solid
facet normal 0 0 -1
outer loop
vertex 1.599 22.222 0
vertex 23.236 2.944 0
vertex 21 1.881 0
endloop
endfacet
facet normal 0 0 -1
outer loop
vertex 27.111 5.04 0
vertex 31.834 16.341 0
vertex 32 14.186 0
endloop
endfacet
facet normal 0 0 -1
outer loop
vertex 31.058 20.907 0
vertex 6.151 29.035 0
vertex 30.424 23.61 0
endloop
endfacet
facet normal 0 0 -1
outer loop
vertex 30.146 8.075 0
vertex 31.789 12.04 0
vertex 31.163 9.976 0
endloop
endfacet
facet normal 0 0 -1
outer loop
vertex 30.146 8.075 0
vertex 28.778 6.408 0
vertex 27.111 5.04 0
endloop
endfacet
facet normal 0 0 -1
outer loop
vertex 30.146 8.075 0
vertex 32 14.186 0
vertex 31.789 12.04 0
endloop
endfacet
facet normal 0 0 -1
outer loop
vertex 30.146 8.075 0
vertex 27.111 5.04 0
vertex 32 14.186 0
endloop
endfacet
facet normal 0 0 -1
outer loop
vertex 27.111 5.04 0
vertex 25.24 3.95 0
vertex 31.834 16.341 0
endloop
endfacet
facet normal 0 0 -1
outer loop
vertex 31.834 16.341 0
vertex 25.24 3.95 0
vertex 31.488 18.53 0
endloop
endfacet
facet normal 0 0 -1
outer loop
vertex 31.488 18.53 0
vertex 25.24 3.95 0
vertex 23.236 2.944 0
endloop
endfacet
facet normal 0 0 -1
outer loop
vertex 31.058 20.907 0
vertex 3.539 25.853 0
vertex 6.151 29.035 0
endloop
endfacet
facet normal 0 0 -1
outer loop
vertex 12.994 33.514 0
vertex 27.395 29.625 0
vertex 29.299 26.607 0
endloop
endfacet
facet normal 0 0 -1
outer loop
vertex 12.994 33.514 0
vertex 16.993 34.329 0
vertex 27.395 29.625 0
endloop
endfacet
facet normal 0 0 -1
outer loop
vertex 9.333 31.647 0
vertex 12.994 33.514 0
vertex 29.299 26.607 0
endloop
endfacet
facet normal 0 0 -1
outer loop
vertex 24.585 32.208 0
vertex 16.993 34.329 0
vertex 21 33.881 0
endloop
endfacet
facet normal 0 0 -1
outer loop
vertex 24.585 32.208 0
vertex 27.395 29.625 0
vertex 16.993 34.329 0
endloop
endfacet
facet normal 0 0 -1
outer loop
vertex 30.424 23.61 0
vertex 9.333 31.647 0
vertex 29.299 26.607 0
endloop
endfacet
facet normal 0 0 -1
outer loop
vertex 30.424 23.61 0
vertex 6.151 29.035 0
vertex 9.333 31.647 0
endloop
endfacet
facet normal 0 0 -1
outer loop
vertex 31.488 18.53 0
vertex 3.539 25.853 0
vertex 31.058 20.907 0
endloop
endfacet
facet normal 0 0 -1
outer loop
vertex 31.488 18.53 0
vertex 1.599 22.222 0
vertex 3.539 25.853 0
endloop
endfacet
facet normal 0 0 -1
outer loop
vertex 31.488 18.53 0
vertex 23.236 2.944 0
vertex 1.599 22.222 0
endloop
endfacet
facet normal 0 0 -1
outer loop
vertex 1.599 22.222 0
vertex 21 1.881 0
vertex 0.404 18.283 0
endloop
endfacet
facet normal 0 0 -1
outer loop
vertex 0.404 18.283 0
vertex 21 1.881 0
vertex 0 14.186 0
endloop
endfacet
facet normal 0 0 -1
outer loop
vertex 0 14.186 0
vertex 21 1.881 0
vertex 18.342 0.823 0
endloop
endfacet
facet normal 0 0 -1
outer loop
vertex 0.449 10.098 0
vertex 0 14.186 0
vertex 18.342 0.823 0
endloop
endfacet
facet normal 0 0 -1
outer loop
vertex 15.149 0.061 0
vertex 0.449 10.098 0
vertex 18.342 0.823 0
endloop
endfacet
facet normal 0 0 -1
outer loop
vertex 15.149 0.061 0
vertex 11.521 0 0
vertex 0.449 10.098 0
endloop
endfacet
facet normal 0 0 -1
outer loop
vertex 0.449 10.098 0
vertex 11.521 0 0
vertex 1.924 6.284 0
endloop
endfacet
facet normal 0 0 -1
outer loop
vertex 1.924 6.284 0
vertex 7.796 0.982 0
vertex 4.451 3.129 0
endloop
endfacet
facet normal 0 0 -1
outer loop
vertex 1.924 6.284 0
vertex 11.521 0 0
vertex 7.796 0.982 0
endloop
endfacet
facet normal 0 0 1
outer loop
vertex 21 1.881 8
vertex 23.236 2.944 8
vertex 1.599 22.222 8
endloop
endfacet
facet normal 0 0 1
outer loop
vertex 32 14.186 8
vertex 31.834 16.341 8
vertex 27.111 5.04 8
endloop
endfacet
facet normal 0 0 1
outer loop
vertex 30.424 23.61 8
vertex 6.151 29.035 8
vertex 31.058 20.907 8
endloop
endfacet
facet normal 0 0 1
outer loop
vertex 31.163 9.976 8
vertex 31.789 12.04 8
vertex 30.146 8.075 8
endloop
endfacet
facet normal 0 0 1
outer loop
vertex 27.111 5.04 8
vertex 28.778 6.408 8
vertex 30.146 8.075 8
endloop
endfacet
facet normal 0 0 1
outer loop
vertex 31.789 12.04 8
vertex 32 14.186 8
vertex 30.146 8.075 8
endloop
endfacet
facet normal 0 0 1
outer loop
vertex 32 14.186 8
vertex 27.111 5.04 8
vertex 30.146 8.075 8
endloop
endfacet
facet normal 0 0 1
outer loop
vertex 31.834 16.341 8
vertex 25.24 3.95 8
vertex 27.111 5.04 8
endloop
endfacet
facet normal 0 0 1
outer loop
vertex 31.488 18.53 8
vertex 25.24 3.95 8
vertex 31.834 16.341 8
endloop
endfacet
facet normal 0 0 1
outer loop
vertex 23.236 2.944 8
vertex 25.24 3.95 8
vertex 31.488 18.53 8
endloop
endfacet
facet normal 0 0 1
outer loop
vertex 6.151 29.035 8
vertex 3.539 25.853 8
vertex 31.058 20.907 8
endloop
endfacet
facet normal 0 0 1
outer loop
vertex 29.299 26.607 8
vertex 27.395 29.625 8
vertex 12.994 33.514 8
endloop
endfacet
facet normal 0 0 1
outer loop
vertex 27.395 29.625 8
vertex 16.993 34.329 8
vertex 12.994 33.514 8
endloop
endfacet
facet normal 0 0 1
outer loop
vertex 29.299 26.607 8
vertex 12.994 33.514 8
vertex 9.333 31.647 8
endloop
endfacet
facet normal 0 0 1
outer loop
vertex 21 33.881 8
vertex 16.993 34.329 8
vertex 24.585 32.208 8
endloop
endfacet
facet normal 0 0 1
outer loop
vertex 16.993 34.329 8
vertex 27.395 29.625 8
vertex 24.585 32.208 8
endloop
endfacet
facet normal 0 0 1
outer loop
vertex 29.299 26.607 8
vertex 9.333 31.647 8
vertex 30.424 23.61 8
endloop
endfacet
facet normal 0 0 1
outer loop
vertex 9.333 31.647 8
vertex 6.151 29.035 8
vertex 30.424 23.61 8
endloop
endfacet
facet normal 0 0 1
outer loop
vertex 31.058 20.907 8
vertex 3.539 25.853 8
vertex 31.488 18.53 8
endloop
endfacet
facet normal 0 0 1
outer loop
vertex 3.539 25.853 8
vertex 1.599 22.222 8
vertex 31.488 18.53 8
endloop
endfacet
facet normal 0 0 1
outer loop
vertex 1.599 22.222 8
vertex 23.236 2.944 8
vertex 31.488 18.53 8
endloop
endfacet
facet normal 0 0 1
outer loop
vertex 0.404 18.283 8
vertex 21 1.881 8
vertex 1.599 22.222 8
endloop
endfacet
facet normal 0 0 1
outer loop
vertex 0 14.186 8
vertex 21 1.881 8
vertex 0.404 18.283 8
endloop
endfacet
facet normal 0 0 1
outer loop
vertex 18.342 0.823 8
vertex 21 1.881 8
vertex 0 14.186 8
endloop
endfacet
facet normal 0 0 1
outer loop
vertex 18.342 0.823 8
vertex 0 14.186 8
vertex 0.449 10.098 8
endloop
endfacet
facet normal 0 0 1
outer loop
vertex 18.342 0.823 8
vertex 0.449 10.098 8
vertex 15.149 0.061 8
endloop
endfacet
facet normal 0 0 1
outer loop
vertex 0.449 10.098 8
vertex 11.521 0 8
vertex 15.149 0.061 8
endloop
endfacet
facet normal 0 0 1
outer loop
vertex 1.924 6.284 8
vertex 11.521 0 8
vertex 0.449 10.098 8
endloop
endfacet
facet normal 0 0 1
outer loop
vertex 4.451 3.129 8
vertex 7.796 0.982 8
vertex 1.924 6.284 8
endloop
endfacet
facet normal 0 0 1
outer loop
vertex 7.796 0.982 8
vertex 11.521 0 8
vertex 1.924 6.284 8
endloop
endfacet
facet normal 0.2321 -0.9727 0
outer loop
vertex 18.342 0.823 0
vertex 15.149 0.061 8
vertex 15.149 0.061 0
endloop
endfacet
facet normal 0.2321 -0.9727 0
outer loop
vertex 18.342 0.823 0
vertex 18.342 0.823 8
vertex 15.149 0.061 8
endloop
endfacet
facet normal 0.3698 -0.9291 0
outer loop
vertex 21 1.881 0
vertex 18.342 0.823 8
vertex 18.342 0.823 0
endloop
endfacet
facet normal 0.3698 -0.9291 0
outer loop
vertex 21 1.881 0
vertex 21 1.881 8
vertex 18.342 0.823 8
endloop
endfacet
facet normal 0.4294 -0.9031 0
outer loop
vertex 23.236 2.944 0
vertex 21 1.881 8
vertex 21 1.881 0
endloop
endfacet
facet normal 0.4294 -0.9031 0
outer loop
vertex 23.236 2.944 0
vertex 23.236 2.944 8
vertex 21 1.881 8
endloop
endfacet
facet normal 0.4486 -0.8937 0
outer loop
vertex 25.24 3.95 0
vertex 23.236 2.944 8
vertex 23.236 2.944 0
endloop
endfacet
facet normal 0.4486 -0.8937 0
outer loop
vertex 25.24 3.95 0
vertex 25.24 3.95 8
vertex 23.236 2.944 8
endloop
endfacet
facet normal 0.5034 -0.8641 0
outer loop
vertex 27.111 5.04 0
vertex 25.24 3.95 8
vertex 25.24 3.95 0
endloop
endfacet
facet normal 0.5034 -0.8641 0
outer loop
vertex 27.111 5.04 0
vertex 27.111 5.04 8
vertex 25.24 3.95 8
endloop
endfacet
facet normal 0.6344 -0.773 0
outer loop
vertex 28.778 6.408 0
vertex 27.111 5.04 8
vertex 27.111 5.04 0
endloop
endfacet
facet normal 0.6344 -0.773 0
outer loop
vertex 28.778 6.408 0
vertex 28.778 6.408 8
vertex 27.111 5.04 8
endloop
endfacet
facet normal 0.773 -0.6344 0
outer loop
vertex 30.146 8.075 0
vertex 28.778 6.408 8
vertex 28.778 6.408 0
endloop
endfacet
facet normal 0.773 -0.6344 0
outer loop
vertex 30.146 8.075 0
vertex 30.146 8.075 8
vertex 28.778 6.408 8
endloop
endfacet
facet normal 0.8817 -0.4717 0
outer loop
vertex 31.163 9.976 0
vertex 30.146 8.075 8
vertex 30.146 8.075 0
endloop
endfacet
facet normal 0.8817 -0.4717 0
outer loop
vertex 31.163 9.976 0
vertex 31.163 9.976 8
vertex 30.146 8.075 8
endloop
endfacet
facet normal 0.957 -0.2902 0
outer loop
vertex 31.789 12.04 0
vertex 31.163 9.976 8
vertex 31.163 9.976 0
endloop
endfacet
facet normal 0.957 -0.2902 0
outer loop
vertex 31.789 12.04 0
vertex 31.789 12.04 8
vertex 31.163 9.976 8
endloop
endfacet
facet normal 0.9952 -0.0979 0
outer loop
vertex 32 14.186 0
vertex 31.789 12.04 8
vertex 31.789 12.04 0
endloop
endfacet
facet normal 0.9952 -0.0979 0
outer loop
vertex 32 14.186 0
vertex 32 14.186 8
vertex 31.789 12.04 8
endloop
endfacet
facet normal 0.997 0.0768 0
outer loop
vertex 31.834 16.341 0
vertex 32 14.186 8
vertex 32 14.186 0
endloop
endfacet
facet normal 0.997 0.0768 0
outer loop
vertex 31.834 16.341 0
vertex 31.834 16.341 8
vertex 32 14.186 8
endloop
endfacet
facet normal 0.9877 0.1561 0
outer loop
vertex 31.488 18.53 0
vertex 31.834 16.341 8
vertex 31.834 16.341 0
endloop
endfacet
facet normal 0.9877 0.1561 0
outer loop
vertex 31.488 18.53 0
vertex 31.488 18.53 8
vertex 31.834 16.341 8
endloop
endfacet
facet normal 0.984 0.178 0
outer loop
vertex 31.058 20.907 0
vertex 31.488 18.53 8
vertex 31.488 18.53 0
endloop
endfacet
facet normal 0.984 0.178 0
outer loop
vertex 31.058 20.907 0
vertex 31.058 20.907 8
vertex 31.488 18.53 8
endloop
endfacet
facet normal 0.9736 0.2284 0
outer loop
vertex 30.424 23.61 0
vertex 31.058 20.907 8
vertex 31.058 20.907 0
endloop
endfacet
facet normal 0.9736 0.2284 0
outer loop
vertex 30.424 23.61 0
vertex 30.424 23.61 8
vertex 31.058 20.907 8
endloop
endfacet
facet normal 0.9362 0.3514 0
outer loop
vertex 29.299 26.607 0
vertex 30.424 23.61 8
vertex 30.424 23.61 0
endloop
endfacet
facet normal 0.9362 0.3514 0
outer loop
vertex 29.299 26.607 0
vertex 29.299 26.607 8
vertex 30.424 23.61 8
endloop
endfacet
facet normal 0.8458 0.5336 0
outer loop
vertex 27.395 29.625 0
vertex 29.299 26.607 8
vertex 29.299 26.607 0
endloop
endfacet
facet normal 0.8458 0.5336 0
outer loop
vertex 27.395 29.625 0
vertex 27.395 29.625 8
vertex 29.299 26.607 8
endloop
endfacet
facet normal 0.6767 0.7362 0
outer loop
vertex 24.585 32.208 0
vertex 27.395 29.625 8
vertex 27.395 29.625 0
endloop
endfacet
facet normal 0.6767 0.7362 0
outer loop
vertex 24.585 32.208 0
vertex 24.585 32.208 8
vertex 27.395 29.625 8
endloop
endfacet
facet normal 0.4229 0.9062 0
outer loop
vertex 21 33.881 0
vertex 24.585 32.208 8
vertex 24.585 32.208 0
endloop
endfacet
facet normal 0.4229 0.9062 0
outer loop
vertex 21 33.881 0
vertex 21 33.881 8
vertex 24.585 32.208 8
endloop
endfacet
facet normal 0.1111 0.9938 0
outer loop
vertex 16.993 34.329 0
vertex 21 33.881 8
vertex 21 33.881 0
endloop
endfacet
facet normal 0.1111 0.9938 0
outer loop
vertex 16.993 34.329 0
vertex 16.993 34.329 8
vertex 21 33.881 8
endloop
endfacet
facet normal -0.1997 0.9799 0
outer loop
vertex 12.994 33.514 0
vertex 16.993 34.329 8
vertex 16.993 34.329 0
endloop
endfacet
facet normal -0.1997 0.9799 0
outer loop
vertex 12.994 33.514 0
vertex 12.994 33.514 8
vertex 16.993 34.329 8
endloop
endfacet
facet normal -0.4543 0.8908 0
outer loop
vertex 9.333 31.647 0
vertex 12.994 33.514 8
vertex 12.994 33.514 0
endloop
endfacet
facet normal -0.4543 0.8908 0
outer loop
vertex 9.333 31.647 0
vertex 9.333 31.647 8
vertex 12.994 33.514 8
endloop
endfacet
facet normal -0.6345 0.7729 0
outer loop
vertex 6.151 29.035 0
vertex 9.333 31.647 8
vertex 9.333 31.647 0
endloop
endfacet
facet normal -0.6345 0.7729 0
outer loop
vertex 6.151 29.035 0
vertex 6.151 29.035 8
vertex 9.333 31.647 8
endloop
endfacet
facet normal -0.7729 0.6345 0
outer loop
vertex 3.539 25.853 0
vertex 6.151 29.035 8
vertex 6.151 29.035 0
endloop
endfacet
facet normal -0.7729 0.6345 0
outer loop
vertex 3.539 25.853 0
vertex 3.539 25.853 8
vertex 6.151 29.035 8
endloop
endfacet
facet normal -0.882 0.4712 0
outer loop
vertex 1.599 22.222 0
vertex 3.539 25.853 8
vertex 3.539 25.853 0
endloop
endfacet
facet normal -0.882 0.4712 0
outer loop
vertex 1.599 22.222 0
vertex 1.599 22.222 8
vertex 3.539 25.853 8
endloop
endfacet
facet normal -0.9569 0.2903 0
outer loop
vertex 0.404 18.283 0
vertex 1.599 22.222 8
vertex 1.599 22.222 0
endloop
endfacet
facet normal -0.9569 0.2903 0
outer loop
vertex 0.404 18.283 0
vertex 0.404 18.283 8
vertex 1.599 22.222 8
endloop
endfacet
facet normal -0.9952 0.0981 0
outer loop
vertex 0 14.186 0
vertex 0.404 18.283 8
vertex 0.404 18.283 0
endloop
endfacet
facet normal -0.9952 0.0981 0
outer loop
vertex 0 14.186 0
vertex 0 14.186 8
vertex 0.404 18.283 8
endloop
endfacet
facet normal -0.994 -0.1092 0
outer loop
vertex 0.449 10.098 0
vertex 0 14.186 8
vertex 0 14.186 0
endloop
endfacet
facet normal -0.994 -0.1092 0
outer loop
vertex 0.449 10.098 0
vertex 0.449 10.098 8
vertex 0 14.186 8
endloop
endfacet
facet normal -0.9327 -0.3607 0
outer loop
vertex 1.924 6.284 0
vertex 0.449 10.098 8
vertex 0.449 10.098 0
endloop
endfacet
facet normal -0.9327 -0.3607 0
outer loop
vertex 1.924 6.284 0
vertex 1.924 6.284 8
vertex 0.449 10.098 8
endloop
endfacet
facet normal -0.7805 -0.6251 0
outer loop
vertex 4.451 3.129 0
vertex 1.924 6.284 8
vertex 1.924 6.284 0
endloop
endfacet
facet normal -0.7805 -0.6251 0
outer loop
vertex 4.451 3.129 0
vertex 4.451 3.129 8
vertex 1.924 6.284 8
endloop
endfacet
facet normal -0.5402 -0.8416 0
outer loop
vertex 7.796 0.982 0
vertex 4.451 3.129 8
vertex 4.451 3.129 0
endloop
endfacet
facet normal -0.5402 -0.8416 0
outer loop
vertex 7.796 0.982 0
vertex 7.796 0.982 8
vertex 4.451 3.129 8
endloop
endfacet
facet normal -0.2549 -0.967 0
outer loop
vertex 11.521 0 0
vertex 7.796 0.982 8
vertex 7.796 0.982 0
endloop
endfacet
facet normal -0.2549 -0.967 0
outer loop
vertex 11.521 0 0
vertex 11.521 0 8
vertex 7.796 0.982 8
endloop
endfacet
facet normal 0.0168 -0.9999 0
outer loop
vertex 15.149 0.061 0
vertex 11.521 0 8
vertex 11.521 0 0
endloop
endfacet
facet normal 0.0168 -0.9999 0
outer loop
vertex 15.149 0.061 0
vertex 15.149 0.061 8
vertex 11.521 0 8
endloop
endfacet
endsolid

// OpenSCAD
$fn = 32;

// ----------------------------------------------------------------------
// Cam disc: base radius 11.0 mm, lift 10.0 mm, 32 profile points
// ----------------------------------------------------------------------

// --- parameters (mm) ---
profile_height = 8;       // extrusion height
profile_points = 32;      // points of the closed outline

profile = [[32, 14.186], [31.834, 16.341], [31.488, 18.53], [31.058, 20.907], [30.424, 23.61], [29.299, 26.607], [27.395, 29.625], [24.585, 32.208], [21, 33.881], [16.993, 34.329], [12.994, 33.514], [9.333, 31.647], [6.151, 29.035], [3.539, 25.853], [1.599, 22.222], [0.404, 18.283], [0, 14.186], [0.449, 10.098], [1.924, 6.284], [4.451, 3.129], [7.796, 0.982], [11.521, 0], [15.149, 0.061], [18.342, 0.823], [21, 1.881], [23.236, 2.944], [25.24, 3.95], [27.111, 5.04], [28.778, 6.408], [30.146, 8.075], [31.163, 9.976], [31.789, 12.04]];  // single closed polygon, 32 points, counter clockwise

// --- the one profile operation ---
linear_extrude(height = profile_height) polygon(points = profile);
